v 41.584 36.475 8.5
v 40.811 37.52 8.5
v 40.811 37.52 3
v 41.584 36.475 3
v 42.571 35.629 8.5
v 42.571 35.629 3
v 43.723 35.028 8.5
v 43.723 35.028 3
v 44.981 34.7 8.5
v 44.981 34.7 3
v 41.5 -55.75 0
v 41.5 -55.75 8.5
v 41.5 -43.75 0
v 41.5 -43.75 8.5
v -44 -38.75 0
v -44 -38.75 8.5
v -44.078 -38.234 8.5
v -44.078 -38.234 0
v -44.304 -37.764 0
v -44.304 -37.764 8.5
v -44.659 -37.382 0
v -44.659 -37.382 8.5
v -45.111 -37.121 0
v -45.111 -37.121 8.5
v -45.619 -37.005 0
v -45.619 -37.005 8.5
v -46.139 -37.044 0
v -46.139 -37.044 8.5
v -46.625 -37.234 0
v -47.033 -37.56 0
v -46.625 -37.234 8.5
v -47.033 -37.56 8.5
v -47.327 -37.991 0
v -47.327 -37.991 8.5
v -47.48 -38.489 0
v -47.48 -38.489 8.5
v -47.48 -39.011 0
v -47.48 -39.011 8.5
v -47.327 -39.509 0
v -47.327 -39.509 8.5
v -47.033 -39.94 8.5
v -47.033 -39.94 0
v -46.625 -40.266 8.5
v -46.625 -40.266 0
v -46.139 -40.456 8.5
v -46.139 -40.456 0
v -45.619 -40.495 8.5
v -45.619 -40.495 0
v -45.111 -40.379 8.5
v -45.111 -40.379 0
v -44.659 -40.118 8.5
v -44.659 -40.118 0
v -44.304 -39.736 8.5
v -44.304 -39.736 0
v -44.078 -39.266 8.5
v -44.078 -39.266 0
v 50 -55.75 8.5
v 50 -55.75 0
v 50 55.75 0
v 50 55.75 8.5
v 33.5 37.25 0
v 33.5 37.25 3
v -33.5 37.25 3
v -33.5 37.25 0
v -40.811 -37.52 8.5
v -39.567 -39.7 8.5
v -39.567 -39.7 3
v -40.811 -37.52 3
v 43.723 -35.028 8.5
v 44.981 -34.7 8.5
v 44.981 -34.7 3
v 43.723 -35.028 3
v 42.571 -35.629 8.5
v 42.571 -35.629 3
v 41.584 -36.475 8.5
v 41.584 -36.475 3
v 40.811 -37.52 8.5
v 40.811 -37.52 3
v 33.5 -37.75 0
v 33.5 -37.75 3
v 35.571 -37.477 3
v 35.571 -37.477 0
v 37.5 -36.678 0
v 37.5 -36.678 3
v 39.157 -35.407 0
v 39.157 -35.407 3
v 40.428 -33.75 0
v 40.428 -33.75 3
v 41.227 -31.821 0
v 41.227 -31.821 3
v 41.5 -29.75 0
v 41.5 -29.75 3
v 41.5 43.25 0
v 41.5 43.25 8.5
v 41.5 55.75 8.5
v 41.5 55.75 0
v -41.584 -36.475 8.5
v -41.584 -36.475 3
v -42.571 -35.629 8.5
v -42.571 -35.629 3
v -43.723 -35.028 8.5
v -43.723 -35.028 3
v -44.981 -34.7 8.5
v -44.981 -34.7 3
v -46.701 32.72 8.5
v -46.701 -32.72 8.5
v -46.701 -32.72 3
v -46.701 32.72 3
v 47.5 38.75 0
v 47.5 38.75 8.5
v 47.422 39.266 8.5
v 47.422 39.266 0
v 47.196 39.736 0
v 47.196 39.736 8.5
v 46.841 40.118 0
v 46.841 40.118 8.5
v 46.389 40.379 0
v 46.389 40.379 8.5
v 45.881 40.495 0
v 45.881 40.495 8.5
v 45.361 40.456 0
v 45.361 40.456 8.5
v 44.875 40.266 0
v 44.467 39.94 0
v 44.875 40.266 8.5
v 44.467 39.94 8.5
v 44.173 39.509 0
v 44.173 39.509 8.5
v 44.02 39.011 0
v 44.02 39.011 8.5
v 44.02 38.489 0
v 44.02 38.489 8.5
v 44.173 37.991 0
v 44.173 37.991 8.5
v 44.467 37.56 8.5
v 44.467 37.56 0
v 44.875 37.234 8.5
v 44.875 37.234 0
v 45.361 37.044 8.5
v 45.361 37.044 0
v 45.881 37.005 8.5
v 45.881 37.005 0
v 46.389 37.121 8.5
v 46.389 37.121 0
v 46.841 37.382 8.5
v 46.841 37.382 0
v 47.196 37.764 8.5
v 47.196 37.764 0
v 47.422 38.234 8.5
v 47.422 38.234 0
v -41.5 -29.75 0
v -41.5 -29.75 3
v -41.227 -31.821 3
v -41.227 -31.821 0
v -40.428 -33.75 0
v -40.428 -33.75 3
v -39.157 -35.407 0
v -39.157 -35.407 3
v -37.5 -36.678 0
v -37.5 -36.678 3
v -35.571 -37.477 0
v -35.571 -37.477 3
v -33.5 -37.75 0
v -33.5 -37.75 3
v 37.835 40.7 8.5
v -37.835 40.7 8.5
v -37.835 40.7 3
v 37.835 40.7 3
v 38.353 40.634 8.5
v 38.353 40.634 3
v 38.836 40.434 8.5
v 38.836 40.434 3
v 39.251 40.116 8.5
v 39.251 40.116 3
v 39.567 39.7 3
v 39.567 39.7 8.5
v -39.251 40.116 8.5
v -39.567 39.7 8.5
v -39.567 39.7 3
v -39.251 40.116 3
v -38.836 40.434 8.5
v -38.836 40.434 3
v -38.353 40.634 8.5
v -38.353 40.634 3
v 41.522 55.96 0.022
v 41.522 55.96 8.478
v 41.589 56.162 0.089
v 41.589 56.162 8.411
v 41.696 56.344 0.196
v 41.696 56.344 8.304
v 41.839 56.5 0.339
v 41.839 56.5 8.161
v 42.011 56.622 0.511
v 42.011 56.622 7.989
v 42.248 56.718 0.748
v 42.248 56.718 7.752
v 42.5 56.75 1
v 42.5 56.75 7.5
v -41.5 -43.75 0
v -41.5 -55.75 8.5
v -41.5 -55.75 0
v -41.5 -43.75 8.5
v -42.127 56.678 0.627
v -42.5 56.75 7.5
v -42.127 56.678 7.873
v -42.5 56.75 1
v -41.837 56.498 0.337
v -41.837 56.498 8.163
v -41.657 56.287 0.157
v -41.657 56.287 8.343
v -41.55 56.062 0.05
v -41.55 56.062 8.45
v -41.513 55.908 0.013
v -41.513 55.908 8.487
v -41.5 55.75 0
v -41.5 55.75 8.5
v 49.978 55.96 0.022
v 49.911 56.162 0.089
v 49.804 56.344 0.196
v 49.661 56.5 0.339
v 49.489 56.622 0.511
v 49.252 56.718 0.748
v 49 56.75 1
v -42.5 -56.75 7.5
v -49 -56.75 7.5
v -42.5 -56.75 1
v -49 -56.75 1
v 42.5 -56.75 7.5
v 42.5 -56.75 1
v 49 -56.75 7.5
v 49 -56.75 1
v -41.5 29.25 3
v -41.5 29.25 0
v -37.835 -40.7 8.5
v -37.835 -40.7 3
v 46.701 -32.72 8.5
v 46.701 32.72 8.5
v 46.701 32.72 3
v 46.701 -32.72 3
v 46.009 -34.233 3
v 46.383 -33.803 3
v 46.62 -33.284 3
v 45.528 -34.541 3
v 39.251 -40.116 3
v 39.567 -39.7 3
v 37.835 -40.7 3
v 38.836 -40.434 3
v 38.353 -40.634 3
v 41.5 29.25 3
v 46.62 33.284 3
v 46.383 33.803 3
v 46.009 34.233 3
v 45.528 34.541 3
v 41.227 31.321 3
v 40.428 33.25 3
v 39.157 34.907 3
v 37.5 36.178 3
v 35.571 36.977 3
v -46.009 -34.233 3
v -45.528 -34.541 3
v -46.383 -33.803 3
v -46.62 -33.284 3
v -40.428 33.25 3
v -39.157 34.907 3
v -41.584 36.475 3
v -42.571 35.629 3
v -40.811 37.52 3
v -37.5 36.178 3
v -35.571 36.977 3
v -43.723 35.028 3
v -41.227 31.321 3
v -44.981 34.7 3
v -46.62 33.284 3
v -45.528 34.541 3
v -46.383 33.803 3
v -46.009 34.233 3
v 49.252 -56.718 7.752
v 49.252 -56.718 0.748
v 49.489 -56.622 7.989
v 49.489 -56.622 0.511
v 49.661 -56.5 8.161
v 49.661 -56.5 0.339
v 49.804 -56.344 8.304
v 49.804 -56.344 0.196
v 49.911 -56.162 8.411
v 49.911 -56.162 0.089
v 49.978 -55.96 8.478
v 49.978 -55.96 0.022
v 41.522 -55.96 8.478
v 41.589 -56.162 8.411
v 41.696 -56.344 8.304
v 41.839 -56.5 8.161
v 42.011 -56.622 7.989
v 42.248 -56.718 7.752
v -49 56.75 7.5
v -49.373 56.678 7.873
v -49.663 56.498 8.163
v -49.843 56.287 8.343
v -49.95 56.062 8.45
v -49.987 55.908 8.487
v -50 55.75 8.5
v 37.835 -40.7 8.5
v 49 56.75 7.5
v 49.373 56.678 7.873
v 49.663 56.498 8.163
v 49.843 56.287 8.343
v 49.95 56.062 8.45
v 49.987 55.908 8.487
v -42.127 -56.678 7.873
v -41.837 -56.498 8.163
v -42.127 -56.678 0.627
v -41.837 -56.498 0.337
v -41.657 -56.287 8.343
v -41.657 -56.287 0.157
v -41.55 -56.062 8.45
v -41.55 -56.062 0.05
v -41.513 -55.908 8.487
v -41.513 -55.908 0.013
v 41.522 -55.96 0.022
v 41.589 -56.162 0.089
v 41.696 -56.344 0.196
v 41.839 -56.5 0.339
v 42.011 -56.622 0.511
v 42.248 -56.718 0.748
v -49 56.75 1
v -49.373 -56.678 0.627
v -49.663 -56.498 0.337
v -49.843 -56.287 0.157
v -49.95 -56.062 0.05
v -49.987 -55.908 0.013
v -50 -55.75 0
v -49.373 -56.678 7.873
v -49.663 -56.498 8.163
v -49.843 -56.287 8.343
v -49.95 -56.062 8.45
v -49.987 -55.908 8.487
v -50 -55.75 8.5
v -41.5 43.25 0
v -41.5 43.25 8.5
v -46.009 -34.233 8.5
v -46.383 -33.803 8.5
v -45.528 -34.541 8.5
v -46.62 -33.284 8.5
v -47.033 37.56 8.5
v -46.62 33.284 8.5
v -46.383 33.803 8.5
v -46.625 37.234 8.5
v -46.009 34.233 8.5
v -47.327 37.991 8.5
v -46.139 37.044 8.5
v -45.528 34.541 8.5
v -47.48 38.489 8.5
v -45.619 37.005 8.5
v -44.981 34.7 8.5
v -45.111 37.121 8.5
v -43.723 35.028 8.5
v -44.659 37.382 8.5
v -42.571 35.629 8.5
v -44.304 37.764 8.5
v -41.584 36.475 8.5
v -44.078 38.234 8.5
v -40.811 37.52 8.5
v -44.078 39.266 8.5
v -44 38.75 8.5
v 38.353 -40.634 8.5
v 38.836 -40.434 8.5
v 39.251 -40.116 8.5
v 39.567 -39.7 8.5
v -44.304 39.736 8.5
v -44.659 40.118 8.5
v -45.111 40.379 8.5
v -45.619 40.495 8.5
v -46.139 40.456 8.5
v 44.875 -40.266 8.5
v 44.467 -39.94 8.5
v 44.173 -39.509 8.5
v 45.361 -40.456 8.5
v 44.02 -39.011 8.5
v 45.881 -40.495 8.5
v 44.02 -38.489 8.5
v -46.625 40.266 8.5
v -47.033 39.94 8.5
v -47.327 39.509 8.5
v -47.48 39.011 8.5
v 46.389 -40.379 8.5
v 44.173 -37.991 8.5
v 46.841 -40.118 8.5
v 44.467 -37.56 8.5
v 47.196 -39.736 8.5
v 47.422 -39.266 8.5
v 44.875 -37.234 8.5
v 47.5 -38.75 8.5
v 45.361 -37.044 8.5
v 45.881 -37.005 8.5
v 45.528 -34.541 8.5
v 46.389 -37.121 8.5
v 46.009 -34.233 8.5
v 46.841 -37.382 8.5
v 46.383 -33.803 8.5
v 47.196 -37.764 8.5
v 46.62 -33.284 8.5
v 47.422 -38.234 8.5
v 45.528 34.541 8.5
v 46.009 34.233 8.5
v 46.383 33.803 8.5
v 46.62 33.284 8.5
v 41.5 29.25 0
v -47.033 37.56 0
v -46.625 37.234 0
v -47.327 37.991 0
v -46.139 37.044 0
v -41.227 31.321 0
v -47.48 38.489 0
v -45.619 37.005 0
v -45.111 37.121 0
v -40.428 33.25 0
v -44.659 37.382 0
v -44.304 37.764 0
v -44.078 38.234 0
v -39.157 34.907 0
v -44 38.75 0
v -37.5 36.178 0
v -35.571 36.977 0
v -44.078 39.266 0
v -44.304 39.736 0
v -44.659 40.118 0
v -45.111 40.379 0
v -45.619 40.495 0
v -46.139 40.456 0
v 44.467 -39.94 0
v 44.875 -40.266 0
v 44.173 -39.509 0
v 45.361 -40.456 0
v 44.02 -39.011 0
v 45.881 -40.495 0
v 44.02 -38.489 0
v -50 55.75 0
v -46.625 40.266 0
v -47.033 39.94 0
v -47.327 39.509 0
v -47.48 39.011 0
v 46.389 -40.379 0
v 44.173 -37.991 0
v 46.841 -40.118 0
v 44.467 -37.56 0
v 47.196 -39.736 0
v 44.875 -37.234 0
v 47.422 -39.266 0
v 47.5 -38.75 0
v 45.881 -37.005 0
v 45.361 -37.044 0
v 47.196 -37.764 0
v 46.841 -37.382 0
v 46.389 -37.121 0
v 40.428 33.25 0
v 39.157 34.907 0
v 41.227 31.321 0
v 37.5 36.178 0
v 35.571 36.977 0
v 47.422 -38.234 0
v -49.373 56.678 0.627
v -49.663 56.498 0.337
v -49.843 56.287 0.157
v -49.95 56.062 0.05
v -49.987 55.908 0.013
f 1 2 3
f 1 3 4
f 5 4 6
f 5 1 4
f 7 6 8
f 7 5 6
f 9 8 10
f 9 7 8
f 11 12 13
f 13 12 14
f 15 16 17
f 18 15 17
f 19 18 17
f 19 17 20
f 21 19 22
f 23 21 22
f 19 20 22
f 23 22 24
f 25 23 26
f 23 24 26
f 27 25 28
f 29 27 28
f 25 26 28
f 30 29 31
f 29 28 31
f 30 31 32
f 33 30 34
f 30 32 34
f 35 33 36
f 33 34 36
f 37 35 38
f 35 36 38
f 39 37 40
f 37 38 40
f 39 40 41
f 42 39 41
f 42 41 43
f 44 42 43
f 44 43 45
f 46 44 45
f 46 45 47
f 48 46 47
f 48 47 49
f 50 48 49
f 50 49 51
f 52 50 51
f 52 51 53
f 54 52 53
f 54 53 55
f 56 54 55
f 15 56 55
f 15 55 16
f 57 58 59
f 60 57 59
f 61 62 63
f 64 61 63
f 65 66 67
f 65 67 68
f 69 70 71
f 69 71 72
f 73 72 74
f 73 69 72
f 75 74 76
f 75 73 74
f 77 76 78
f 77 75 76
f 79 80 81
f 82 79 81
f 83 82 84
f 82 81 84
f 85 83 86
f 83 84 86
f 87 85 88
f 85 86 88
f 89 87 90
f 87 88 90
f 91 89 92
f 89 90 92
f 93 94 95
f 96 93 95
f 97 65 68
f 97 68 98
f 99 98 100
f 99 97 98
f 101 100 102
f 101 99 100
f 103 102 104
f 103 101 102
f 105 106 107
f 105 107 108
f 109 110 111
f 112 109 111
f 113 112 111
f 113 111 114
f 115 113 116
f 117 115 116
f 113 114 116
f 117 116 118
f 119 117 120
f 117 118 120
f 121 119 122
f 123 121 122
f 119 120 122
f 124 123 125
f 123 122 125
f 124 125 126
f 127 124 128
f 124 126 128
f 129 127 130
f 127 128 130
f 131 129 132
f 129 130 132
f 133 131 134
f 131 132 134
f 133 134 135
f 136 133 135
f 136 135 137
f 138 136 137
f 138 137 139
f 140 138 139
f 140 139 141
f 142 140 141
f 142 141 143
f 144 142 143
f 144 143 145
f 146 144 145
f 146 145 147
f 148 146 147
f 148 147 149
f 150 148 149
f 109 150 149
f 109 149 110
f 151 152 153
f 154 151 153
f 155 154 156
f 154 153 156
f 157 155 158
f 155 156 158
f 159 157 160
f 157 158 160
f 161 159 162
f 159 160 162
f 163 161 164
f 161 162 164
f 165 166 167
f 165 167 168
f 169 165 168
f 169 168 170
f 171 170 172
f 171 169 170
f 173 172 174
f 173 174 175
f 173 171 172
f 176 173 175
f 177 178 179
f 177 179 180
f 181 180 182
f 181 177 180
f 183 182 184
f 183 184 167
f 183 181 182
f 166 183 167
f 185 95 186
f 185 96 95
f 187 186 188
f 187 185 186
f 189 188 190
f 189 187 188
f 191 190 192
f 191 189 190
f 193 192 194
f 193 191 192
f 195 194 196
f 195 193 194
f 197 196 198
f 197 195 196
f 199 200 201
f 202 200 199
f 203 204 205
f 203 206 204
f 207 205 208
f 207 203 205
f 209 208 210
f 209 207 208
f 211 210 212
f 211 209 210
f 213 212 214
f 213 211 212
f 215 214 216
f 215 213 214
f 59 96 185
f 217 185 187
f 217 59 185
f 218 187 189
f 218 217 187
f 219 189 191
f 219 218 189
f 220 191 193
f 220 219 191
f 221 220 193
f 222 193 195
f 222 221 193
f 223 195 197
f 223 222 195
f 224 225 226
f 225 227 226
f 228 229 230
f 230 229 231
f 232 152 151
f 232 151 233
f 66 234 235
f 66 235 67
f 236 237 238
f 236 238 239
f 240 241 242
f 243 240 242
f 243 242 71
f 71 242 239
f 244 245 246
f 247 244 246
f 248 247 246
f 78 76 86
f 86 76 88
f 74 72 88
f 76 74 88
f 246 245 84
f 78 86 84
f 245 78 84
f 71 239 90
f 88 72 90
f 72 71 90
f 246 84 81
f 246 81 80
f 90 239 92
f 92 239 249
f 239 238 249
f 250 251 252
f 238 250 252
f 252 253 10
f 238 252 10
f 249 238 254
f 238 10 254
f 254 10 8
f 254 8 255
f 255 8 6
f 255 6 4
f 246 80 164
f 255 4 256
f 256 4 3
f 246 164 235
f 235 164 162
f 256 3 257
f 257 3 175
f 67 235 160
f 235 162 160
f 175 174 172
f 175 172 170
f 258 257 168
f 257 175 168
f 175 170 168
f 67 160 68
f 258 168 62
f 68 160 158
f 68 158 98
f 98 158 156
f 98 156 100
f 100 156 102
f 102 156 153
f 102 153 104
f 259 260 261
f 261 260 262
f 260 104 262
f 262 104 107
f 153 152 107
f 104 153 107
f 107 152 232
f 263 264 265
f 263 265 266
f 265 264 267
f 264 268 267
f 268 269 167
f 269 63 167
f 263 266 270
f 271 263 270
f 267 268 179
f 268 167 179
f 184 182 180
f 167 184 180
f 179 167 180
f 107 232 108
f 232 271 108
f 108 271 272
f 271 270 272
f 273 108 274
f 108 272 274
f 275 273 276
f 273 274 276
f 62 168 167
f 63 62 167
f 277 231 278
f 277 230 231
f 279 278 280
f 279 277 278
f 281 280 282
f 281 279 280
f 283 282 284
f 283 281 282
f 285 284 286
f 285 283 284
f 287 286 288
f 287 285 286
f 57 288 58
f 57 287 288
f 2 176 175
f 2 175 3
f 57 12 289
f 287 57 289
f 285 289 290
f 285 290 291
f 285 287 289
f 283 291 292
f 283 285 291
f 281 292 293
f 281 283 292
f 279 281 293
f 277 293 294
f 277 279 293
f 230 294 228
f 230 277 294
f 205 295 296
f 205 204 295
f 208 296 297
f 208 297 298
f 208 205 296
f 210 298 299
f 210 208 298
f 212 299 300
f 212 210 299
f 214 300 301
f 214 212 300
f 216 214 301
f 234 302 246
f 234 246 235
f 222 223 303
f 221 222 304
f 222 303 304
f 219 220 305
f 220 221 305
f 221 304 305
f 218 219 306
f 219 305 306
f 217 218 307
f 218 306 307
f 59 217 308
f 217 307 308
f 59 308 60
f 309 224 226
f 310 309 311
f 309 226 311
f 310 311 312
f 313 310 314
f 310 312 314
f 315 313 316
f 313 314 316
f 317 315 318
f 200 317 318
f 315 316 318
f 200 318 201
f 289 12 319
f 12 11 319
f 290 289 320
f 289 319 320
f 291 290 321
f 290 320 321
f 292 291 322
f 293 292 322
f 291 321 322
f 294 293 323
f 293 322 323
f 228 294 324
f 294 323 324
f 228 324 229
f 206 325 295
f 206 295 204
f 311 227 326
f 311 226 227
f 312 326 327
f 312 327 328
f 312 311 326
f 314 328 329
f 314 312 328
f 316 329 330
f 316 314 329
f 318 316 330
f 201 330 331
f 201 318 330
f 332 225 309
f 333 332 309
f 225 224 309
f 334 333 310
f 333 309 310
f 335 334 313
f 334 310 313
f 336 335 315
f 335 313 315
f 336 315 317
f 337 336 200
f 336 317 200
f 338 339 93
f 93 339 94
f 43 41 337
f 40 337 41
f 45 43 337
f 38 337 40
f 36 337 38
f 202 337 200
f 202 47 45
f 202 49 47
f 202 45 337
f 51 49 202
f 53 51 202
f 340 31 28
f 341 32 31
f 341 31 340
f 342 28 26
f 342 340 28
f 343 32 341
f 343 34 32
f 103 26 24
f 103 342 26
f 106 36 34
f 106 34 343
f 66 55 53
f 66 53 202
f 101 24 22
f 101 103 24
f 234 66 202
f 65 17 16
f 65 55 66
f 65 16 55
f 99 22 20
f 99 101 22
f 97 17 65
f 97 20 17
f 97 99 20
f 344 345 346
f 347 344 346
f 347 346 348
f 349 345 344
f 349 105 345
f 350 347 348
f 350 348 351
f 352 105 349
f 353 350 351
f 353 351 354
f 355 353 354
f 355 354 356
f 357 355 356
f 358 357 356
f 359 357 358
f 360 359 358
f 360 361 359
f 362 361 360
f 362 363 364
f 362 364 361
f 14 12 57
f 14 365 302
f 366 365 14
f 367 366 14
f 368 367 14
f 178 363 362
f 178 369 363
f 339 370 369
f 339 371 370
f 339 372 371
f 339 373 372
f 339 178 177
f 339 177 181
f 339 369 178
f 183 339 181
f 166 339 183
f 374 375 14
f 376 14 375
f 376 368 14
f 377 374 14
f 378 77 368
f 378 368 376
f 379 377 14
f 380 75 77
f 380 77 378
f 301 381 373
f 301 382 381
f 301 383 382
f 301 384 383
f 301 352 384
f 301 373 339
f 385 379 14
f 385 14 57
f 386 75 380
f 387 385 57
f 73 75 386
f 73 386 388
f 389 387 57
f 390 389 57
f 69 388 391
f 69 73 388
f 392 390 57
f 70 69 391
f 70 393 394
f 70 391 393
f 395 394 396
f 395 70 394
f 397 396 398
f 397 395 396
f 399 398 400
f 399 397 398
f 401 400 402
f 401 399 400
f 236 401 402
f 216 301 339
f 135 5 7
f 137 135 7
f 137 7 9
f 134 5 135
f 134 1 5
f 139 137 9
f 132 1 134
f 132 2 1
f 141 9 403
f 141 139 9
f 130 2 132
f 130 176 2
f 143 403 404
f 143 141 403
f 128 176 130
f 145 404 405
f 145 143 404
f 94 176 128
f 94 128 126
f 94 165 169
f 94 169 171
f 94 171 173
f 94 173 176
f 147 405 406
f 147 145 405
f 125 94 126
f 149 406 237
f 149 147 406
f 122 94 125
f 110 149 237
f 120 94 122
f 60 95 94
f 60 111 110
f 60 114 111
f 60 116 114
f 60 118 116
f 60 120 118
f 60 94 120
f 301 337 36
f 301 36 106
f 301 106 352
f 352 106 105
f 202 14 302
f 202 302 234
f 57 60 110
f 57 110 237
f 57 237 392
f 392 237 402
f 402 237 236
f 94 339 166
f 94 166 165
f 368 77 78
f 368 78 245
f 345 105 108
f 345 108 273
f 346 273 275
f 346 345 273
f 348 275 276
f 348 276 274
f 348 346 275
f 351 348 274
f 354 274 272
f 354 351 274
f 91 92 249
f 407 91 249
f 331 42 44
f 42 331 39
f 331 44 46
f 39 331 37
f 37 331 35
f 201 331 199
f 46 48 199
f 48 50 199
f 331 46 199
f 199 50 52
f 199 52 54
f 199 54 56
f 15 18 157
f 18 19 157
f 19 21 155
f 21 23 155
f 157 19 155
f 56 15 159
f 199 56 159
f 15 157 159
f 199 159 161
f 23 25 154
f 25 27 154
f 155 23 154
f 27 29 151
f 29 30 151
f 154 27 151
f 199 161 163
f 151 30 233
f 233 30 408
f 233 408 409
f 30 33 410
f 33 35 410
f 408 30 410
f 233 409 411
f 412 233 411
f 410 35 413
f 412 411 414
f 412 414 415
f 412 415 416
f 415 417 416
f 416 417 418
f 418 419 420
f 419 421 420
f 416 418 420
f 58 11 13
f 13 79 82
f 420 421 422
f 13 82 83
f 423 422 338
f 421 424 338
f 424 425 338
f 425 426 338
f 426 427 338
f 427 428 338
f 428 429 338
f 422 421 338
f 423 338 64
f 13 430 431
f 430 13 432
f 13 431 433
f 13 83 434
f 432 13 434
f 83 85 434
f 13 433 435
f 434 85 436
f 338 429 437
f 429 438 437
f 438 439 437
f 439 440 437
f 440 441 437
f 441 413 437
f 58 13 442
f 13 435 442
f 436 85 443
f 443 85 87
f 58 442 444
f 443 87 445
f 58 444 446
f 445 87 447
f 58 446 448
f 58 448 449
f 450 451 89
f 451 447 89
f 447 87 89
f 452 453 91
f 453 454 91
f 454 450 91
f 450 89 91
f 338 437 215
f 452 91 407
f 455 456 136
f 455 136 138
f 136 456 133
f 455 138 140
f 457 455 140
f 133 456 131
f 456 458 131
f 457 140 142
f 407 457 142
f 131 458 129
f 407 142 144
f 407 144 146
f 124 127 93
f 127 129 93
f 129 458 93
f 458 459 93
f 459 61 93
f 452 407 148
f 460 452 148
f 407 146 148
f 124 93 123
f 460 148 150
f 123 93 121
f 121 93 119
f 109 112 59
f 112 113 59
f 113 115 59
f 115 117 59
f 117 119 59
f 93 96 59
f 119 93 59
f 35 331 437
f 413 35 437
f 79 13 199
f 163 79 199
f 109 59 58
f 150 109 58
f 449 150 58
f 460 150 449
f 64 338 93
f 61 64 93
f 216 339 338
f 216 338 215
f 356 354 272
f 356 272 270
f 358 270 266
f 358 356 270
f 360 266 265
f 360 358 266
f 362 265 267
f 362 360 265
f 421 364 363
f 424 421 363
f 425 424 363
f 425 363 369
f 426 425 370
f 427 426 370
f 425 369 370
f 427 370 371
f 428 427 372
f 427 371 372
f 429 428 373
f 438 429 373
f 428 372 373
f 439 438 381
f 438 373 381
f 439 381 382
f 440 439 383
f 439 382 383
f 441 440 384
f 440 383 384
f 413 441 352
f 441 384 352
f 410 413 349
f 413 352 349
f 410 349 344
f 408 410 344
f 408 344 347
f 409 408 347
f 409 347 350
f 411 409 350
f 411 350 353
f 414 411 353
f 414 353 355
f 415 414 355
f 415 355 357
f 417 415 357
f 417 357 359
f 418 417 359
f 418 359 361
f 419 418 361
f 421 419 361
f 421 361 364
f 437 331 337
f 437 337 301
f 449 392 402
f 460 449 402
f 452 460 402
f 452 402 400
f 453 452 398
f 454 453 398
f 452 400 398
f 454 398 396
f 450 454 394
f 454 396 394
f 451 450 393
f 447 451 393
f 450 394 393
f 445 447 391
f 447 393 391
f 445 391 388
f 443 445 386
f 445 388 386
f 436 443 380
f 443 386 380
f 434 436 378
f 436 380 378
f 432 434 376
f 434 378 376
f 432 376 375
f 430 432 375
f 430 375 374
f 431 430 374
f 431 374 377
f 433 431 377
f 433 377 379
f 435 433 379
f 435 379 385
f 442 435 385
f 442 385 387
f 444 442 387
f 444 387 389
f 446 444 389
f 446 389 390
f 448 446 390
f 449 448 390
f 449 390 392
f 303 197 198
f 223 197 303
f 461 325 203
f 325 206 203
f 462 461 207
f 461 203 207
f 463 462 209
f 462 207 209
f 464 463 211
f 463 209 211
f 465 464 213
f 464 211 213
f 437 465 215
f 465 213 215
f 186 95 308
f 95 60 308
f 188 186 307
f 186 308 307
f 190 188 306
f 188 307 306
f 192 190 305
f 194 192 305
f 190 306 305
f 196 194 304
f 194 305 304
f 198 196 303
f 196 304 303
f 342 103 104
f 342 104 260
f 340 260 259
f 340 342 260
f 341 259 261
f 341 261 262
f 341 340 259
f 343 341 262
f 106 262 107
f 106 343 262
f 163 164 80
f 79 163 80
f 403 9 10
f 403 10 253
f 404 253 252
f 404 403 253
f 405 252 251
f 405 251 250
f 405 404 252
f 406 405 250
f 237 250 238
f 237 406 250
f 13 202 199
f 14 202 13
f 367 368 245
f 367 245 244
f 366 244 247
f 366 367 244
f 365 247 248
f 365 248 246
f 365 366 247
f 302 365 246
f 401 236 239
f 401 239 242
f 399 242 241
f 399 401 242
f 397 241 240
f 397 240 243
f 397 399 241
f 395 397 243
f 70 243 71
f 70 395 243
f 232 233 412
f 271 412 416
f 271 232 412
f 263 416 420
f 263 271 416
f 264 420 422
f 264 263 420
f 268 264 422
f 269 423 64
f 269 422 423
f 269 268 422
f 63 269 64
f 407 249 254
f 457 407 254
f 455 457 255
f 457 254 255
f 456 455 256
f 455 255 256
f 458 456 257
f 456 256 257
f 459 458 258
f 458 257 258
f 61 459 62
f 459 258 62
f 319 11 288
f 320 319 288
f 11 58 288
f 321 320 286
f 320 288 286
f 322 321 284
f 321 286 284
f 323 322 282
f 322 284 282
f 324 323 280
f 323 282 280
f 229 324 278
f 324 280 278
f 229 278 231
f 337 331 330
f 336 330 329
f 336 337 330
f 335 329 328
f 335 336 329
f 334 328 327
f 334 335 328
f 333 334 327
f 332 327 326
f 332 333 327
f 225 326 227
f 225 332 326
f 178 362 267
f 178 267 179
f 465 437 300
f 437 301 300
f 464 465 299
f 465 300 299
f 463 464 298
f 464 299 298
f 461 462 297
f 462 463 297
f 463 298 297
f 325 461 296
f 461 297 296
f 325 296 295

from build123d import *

# Parameters (mm, degrees)
SKETCH1_W           = 100
SKETCH1_H           = 113.5
BOSS_EXTRUDE1_DEPTH = 8.5
CUT_EXTRUDE1_REACH  = 78.111
SKETCH2_W           = 83
SKETCH2_H           = 13.5
SKETCH2_H_2         = 13
SKETCH2_W_2         = 10
SKETCH2_H_3         = 10
SKETCH2_R           = 1.75
CUT_EXTRUDE2_REACH  = 78.111
SKETCH6_W           = 10
SKETCH6_H           = 10
FILLET1_R           = 1
SKETCH8_W           = 10
SKETCH8_H           = 10
CUT_EXTRUDE5_DEPTH  = 5.5
CUT_EXTRUDE6_DEPTH  = 76.834111718


with BuildPart() as part:
    # Sketch1 → Boss-Extrude1 (new body)
    with BuildSketch(Plane.XY):
        Rectangle(SKETCH1_W, SKETCH1_H)
    extrude(amount=BOSS_EXTRUDE1_DEPTH)

    # Sketch2 → Cut-Extrude1 (cut, up to next)
    with BuildSketch(Plane.XY.offset(8.5), mode=Mode.PRIVATE) as cut_extrude1_sk1:
        with Locations((0, 50)):
            Rectangle(SKETCH2_W, SKETCH2_H)
    cut_extrude1_tool1 = extrude(cut_extrude1_sk1.sketch, amount=-CUT_EXTRUDE1_REACH, mode=Mode.PRIVATE) & part.part
    # Sketch2 → Cut-Extrude1 (cut, up to next)
    with BuildSketch(Plane.XY.offset(8.5), mode=Mode.PRIVATE) as cut_extrude1_sk2:
        with BuildLine():
            ThreePointArc((-41.5, -29.75), (-39.156854249, -35.406854249), (-33.5, -37.75))
            Line((-33.5, -37.75), (33.5, -37.75))
            ThreePointArc((33.5, -37.75), (39.156854249, -35.406854249), (41.5, -29.75))
            Line((41.5, -29.75), (41.5, -0.25))
            Line((41.5, -0.25), (-41.5, -0.25))
            Line((-41.5, -0.25), (-41.5, -29.75))
        make_face()
    cut_extrude1_tool2 = extrude(cut_extrude1_sk2.sketch, amount=-CUT_EXTRUDE1_REACH, mode=Mode.PRIVATE) & part.part
    # Sketch2 → Cut-Extrude1 (cut, up to next)
    with BuildSketch(Plane.XY.offset(8.5), mode=Mode.PRIVATE) as cut_extrude1_sk3:
        with Locations((0, -50.25)):
            Rectangle(SKETCH2_W, SKETCH2_H_2)
    cut_extrude1_tool3 = extrude(cut_extrude1_sk3.sketch, amount=-CUT_EXTRUDE1_REACH, mode=Mode.PRIVATE) & part.part
    # Sketch2 → Cut-Extrude1 (cut, up to next)
    with BuildSketch(Plane.XY.offset(8.5), mode=Mode.PRIVATE) as cut_extrude1_sk4:
        with Locations((-11.75, 22.75)):
            Rectangle(SKETCH2_W_2, SKETCH2_H_3)
    cut_extrude1_tool4 = extrude(cut_extrude1_sk4.sketch, amount=-CUT_EXTRUDE1_REACH, mode=Mode.PRIVATE) & part.part
    # Sketch2 → Cut-Extrude1 (cut, up to next)
    with BuildSketch(Plane.XY.offset(8.5), mode=Mode.PRIVATE) as cut_extrude1_sk5:
        with Locations((45.75, 38.75)):
            Circle(SKETCH2_R)
    cut_extrude1_tool5 = extrude(cut_extrude1_sk5.sketch, amount=-CUT_EXTRUDE1_REACH, mode=Mode.PRIVATE) & part.part
    # Sketch2 → Cut-Extrude1 (cut, up to next)
    with BuildSketch(Plane.XY.offset(8.5), mode=Mode.PRIVATE) as cut_extrude1_sk6:
        with Locations((45.75, -38.75)):
            Circle(SKETCH2_R)
    cut_extrude1_tool6 = extrude(cut_extrude1_sk6.sketch, amount=-CUT_EXTRUDE1_REACH, mode=Mode.PRIVATE) & part.part
    # Sketch2 → Cut-Extrude1 (cut, up to next)
    with BuildSketch(Plane.XY.offset(8.5), mode=Mode.PRIVATE) as cut_extrude1_sk7:
        with Locations((-45.75, 38.75)):
            Circle(SKETCH2_R)
    cut_extrude1_tool7 = extrude(cut_extrude1_sk7.sketch, amount=-CUT_EXTRUDE1_REACH, mode=Mode.PRIVATE) & part.part
    # Sketch2 → Cut-Extrude1 (cut, up to next)
    with BuildSketch(Plane.XY.offset(8.5), mode=Mode.PRIVATE) as cut_extrude1_sk8:
        with Locations((-45.75, -38.75)):
            Circle(SKETCH2_R)
    cut_extrude1_tool8 = extrude(cut_extrude1_sk8.sketch, amount=-CUT_EXTRUDE1_REACH, mode=Mode.PRIVATE) & part.part
    add(cut_extrude1_tool1.solids().sort_by_distance((0, 50, 8.5))[0], mode=Mode.SUBTRACT)
    add(cut_extrude1_tool2.solids().sort_by_distance((0, -18.848961, 8.5))[0], mode=Mode.SUBTRACT)
    add(cut_extrude1_tool3.solids().sort_by_distance((0, -50.25, 8.5))[0], mode=Mode.SUBTRACT)
    add(cut_extrude1_tool4.solids().sort_by_distance((-11.75, 22.75, 8.5))[0], mode=Mode.SUBTRACT)
    add(cut_extrude1_tool5.solids().sort_by_distance((45.75, 38.75, 8.5))[0], mode=Mode.SUBTRACT)
    add(cut_extrude1_tool6.solids().sort_by_distance((45.75, -38.75, 8.5))[0], mode=Mode.SUBTRACT)
    add(cut_extrude1_tool7.solids().sort_by_distance((-45.75, 38.75, 8.5))[0], mode=Mode.SUBTRACT)
    add(cut_extrude1_tool8.solids().sort_by_distance((-45.75, -38.75, 8.5))[0], mode=Mode.SUBTRACT)

    # Sketch6 → Cut-Extrude2 (cut, up to next)
    with BuildSketch(Plane.XY.offset(8.5), mode=Mode.PRIVATE) as cut_extrude2_sk1:
        with BuildLine():
            Line((41.5, 8.25), (41.5, 29.25))
            ThreePointArc((41.5, 29.25), (39.156854249, 34.906854249), (33.5, 37.25))
            Line((33.5, 37.25), (28.5, 37.25))
            Line((28.5, 37.25), (28.5, 8.25))
            Line((28.5, 8.25), (33.5, 8.25))
            Line((33.5, 8.25), (41.5, 8.25))
        make_face()
    cut_extrude2_tool1 = extrude(cut_extrude2_sk1.sketch, amount=-CUT_EXTRUDE2_REACH, mode=Mode.PRIVATE) & part.part
    # Sketch6 → Cut-Extrude2 (cut, up to next)
    with BuildSketch(Plane.XY.offset(8.5), mode=Mode.PRIVATE) as cut_extrude2_sk2:
        with Locations((11.75, 22.75)):
            Rectangle(SKETCH6_W, SKETCH6_H)
    cut_extrude2_tool2 = extrude(cut_extrude2_sk2.sketch, amount=-CUT_EXTRUDE2_REACH, mode=Mode.PRIVATE) & part.part
    # Sketch6 → Cut-Extrude2 (cut, up to next)
    with BuildSketch(Plane.XY.offset(8.5), mode=Mode.PRIVATE) as cut_extrude2_sk3:
        with BuildLine():
            Line((-41.5, 8.25), (-41.5, 29.25))
            ThreePointArc((-41.5, 29.25), (-39.156854249, 34.906854249), (-33.5, 37.25))
            Line((-33.5, 37.25), (-28.5, 37.25))
            Line((-28.5, 37.25), (-28.5, 8.25))
            Line((-28.5, 8.25), (-33.5, 8.25))
            Line((-33.5, 8.25), (-41.5, 8.25))
        make_face()
    cut_extrude2_tool3 = extrude(cut_extrude2_sk3.sketch, amount=-CUT_EXTRUDE2_REACH, mode=Mode.PRIVATE) & part.part
    add(cut_extrude2_tool1.solids().sort_by_distance((34.821806, 22.269339, 8.5))[0], mode=Mode.SUBTRACT)
    add(cut_extrude2_tool2.solids().sort_by_distance((11.75, 22.75, 8.5))[0], mode=Mode.SUBTRACT)
    add(cut_extrude2_tool3.solids().sort_by_distance((-34.821806, 22.269339, 8.5))[0], mode=Mode.SUBTRACT)

    # Fillet1
    fillet1_edges = [part.edges().sort_by_distance(p)[0] for p in [
        (45.75, -56.75, 0),
        (-45.75, 56.75, 0),
        (-45.75, -56.75, 8.5),
        (-45.75, 56.75, 8.5),
        (45.75, -56.75, 8.5),
        (-41.5, 56.75, 4.25),
        (41.5, 56.75, 4.25),
        (41.5, -56.75, 4.25),
        (-41.5, -56.75, 4.25),
        (-45.75, -56.75, 0),
        (45.75, 56.75, 0),
        (50, -56.75, 4.25),
        (-50, -56.75, 4.25),
        (-50, 56.75, 4.25),
        (50, 56.75, 4.25),
        (45.75, 56.75, 8.5),
    ]]
    fillet(fillet1_edges, radius=FILLET1_R)

    # Sketch8 → Cut-Extrude5 (cut)
    with BuildSketch(Plane.XY.offset(8.5)):
        with BuildLine():
            ThreePointArc((-46.701116722, 32.72), (-46.210984272, 34.031299083), (-44.981116722, 34.7))
            ThreePointArc((-44.981116722, 34.7), (-42.571113581, 35.629410248), (-40.811116722, 37.52))
            Line((-40.811116722, 37.52), (-39.567050808, 39.7))
            ThreePointArc((-39.567050808, 39.7), (-38.836346779, 40.434383498), (-37.835, 40.7))
            Line((-37.835, 40.7), (37.835, 40.7))
            ThreePointArc((37.835, 40.7), (38.836346779, 40.434383498), (39.567050808, 39.7))
            Line((39.567050808, 39.7), (40.811116722, 37.52))
            ThreePointArc((40.811116722, 37.52), (42.571113581, 35.629410248), (44.981116722, 34.7))
            ThreePointArc((44.981116722, 34.7), (46.210984272, 34.031299083), (46.701116722, 32.72))
            Line((46.701116722, 32.72), (46.701116722, -32.72))
            ThreePointArc((46.701116722, -32.72), (46.210984272, -34.031299083), (44.981116722, -34.7))
            ThreePointArc((44.981116722, -34.7), (42.571113581, -35.629410248), (40.811116722, -37.52))
            Line((40.811116722, -37.52), (39.567050808, -39.7))
            ThreePointArc((39.567050808, -39.7), (38.836346779, -40.434383498), (37.835, -40.7))
            Line((37.835, -40.7), (-37.835, -40.7))
            Line((-37.835, -40.7), (-39.567050808, -39.7))
            Line((-39.567050808, -39.7), (-40.811116722, -37.52))
            ThreePointArc((-40.811116722, -37.52), (-42.571113581, -35.629410248), (-44.981116722, -34.7))
            ThreePointArc((-44.981116722, -34.7), (-46.210984272, -34.031299083), (-46.701116722, -32.72))
            Line((-46.701116722, -32.72), (-46.701116722, 32.72))
        make_face()
        with Locations((-11.75, 22.75)):
            Rectangle(SKETCH8_W, SKETCH8_H, mode=Mode.SUBTRACT)
        with BuildLine():
            Line((33.5, -37.75), (-33.5, -37.75))
            ThreePointArc((-33.5, -37.75), (-39.156854249, -35.406854249), (-41.5, -29.75))
            Line((-41.5, -29.75), (-41.5, -0.25))
            Line((-41.5, -0.25), (41.5, -0.25))
            Line((41.5, -0.25), (41.5, -29.75))
            ThreePointArc((41.5, -29.75), (39.156854249, -35.406854249), (33.5, -37.75))
        make_face(mode=Mode.SUBTRACT)
        with Locations((11.75, 22.75)):
            Rectangle(SKETCH8_W, SKETCH8_H, mode=Mode.SUBTRACT)
        with BuildLine():
            Line((-41.5, 8.25), (-41.5, 29.25))
            ThreePointArc((-41.5, 29.25), (-39.156854249, 34.906854249), (-33.5, 37.25))
            Line((-33.5, 37.25), (-28.5, 37.25))
            Line((-28.5, 37.25), (-28.5, 8.25))
            Line((-28.5, 8.25), (-41.5, 8.25))
        make_face(mode=Mode.SUBTRACT)
        with BuildLine():
            Line((41.5, 8.25), (28.5, 8.25))
            Line((28.5, 8.25), (28.5, 37.25))
            Line((28.5, 37.25), (33.5, 37.25))
            ThreePointArc((33.5, 37.25), (39.156854249, 34.906854249), (41.5, 29.25))
            Line((41.5, 29.25), (41.5, 8.25))
        make_face(mode=Mode.SUBTRACT)
    extrude(amount=-CUT_EXTRUDE5_DEPTH, mode=Mode.SUBTRACT)

    # Sketch9 → Cut-Extrude6 (cut, through all)
    with BuildSketch(Plane.XY.offset(3)):
        with BuildLine():
            Line((-33.5, -37.75), (33.5, -37.75))
            ThreePointArc((33.5, -37.75), (39.156854249, -35.406854249), (41.5, -29.75))
            Line((41.5, -29.75), (41.5, 29.25))
            ThreePointArc((41.5, 29.25), (39.156854249, 34.906854249), (33.5, 37.25))
            Line((33.5, 37.25), (-33.5, 37.25))
            ThreePointArc((-33.5, 37.25), (-39.156854249, 34.906854249), (-41.5, 29.25))
            Line((-41.5, 29.25), (-41.5, -29.75))
            ThreePointArc((-41.5, -29.75), (-39.156854249, -35.406854249), (-33.5, -37.75))
        make_face()
    extrude(amount=-CUT_EXTRUDE6_DEPTH, mode=Mode.SUBTRACT)


solid = part.part
